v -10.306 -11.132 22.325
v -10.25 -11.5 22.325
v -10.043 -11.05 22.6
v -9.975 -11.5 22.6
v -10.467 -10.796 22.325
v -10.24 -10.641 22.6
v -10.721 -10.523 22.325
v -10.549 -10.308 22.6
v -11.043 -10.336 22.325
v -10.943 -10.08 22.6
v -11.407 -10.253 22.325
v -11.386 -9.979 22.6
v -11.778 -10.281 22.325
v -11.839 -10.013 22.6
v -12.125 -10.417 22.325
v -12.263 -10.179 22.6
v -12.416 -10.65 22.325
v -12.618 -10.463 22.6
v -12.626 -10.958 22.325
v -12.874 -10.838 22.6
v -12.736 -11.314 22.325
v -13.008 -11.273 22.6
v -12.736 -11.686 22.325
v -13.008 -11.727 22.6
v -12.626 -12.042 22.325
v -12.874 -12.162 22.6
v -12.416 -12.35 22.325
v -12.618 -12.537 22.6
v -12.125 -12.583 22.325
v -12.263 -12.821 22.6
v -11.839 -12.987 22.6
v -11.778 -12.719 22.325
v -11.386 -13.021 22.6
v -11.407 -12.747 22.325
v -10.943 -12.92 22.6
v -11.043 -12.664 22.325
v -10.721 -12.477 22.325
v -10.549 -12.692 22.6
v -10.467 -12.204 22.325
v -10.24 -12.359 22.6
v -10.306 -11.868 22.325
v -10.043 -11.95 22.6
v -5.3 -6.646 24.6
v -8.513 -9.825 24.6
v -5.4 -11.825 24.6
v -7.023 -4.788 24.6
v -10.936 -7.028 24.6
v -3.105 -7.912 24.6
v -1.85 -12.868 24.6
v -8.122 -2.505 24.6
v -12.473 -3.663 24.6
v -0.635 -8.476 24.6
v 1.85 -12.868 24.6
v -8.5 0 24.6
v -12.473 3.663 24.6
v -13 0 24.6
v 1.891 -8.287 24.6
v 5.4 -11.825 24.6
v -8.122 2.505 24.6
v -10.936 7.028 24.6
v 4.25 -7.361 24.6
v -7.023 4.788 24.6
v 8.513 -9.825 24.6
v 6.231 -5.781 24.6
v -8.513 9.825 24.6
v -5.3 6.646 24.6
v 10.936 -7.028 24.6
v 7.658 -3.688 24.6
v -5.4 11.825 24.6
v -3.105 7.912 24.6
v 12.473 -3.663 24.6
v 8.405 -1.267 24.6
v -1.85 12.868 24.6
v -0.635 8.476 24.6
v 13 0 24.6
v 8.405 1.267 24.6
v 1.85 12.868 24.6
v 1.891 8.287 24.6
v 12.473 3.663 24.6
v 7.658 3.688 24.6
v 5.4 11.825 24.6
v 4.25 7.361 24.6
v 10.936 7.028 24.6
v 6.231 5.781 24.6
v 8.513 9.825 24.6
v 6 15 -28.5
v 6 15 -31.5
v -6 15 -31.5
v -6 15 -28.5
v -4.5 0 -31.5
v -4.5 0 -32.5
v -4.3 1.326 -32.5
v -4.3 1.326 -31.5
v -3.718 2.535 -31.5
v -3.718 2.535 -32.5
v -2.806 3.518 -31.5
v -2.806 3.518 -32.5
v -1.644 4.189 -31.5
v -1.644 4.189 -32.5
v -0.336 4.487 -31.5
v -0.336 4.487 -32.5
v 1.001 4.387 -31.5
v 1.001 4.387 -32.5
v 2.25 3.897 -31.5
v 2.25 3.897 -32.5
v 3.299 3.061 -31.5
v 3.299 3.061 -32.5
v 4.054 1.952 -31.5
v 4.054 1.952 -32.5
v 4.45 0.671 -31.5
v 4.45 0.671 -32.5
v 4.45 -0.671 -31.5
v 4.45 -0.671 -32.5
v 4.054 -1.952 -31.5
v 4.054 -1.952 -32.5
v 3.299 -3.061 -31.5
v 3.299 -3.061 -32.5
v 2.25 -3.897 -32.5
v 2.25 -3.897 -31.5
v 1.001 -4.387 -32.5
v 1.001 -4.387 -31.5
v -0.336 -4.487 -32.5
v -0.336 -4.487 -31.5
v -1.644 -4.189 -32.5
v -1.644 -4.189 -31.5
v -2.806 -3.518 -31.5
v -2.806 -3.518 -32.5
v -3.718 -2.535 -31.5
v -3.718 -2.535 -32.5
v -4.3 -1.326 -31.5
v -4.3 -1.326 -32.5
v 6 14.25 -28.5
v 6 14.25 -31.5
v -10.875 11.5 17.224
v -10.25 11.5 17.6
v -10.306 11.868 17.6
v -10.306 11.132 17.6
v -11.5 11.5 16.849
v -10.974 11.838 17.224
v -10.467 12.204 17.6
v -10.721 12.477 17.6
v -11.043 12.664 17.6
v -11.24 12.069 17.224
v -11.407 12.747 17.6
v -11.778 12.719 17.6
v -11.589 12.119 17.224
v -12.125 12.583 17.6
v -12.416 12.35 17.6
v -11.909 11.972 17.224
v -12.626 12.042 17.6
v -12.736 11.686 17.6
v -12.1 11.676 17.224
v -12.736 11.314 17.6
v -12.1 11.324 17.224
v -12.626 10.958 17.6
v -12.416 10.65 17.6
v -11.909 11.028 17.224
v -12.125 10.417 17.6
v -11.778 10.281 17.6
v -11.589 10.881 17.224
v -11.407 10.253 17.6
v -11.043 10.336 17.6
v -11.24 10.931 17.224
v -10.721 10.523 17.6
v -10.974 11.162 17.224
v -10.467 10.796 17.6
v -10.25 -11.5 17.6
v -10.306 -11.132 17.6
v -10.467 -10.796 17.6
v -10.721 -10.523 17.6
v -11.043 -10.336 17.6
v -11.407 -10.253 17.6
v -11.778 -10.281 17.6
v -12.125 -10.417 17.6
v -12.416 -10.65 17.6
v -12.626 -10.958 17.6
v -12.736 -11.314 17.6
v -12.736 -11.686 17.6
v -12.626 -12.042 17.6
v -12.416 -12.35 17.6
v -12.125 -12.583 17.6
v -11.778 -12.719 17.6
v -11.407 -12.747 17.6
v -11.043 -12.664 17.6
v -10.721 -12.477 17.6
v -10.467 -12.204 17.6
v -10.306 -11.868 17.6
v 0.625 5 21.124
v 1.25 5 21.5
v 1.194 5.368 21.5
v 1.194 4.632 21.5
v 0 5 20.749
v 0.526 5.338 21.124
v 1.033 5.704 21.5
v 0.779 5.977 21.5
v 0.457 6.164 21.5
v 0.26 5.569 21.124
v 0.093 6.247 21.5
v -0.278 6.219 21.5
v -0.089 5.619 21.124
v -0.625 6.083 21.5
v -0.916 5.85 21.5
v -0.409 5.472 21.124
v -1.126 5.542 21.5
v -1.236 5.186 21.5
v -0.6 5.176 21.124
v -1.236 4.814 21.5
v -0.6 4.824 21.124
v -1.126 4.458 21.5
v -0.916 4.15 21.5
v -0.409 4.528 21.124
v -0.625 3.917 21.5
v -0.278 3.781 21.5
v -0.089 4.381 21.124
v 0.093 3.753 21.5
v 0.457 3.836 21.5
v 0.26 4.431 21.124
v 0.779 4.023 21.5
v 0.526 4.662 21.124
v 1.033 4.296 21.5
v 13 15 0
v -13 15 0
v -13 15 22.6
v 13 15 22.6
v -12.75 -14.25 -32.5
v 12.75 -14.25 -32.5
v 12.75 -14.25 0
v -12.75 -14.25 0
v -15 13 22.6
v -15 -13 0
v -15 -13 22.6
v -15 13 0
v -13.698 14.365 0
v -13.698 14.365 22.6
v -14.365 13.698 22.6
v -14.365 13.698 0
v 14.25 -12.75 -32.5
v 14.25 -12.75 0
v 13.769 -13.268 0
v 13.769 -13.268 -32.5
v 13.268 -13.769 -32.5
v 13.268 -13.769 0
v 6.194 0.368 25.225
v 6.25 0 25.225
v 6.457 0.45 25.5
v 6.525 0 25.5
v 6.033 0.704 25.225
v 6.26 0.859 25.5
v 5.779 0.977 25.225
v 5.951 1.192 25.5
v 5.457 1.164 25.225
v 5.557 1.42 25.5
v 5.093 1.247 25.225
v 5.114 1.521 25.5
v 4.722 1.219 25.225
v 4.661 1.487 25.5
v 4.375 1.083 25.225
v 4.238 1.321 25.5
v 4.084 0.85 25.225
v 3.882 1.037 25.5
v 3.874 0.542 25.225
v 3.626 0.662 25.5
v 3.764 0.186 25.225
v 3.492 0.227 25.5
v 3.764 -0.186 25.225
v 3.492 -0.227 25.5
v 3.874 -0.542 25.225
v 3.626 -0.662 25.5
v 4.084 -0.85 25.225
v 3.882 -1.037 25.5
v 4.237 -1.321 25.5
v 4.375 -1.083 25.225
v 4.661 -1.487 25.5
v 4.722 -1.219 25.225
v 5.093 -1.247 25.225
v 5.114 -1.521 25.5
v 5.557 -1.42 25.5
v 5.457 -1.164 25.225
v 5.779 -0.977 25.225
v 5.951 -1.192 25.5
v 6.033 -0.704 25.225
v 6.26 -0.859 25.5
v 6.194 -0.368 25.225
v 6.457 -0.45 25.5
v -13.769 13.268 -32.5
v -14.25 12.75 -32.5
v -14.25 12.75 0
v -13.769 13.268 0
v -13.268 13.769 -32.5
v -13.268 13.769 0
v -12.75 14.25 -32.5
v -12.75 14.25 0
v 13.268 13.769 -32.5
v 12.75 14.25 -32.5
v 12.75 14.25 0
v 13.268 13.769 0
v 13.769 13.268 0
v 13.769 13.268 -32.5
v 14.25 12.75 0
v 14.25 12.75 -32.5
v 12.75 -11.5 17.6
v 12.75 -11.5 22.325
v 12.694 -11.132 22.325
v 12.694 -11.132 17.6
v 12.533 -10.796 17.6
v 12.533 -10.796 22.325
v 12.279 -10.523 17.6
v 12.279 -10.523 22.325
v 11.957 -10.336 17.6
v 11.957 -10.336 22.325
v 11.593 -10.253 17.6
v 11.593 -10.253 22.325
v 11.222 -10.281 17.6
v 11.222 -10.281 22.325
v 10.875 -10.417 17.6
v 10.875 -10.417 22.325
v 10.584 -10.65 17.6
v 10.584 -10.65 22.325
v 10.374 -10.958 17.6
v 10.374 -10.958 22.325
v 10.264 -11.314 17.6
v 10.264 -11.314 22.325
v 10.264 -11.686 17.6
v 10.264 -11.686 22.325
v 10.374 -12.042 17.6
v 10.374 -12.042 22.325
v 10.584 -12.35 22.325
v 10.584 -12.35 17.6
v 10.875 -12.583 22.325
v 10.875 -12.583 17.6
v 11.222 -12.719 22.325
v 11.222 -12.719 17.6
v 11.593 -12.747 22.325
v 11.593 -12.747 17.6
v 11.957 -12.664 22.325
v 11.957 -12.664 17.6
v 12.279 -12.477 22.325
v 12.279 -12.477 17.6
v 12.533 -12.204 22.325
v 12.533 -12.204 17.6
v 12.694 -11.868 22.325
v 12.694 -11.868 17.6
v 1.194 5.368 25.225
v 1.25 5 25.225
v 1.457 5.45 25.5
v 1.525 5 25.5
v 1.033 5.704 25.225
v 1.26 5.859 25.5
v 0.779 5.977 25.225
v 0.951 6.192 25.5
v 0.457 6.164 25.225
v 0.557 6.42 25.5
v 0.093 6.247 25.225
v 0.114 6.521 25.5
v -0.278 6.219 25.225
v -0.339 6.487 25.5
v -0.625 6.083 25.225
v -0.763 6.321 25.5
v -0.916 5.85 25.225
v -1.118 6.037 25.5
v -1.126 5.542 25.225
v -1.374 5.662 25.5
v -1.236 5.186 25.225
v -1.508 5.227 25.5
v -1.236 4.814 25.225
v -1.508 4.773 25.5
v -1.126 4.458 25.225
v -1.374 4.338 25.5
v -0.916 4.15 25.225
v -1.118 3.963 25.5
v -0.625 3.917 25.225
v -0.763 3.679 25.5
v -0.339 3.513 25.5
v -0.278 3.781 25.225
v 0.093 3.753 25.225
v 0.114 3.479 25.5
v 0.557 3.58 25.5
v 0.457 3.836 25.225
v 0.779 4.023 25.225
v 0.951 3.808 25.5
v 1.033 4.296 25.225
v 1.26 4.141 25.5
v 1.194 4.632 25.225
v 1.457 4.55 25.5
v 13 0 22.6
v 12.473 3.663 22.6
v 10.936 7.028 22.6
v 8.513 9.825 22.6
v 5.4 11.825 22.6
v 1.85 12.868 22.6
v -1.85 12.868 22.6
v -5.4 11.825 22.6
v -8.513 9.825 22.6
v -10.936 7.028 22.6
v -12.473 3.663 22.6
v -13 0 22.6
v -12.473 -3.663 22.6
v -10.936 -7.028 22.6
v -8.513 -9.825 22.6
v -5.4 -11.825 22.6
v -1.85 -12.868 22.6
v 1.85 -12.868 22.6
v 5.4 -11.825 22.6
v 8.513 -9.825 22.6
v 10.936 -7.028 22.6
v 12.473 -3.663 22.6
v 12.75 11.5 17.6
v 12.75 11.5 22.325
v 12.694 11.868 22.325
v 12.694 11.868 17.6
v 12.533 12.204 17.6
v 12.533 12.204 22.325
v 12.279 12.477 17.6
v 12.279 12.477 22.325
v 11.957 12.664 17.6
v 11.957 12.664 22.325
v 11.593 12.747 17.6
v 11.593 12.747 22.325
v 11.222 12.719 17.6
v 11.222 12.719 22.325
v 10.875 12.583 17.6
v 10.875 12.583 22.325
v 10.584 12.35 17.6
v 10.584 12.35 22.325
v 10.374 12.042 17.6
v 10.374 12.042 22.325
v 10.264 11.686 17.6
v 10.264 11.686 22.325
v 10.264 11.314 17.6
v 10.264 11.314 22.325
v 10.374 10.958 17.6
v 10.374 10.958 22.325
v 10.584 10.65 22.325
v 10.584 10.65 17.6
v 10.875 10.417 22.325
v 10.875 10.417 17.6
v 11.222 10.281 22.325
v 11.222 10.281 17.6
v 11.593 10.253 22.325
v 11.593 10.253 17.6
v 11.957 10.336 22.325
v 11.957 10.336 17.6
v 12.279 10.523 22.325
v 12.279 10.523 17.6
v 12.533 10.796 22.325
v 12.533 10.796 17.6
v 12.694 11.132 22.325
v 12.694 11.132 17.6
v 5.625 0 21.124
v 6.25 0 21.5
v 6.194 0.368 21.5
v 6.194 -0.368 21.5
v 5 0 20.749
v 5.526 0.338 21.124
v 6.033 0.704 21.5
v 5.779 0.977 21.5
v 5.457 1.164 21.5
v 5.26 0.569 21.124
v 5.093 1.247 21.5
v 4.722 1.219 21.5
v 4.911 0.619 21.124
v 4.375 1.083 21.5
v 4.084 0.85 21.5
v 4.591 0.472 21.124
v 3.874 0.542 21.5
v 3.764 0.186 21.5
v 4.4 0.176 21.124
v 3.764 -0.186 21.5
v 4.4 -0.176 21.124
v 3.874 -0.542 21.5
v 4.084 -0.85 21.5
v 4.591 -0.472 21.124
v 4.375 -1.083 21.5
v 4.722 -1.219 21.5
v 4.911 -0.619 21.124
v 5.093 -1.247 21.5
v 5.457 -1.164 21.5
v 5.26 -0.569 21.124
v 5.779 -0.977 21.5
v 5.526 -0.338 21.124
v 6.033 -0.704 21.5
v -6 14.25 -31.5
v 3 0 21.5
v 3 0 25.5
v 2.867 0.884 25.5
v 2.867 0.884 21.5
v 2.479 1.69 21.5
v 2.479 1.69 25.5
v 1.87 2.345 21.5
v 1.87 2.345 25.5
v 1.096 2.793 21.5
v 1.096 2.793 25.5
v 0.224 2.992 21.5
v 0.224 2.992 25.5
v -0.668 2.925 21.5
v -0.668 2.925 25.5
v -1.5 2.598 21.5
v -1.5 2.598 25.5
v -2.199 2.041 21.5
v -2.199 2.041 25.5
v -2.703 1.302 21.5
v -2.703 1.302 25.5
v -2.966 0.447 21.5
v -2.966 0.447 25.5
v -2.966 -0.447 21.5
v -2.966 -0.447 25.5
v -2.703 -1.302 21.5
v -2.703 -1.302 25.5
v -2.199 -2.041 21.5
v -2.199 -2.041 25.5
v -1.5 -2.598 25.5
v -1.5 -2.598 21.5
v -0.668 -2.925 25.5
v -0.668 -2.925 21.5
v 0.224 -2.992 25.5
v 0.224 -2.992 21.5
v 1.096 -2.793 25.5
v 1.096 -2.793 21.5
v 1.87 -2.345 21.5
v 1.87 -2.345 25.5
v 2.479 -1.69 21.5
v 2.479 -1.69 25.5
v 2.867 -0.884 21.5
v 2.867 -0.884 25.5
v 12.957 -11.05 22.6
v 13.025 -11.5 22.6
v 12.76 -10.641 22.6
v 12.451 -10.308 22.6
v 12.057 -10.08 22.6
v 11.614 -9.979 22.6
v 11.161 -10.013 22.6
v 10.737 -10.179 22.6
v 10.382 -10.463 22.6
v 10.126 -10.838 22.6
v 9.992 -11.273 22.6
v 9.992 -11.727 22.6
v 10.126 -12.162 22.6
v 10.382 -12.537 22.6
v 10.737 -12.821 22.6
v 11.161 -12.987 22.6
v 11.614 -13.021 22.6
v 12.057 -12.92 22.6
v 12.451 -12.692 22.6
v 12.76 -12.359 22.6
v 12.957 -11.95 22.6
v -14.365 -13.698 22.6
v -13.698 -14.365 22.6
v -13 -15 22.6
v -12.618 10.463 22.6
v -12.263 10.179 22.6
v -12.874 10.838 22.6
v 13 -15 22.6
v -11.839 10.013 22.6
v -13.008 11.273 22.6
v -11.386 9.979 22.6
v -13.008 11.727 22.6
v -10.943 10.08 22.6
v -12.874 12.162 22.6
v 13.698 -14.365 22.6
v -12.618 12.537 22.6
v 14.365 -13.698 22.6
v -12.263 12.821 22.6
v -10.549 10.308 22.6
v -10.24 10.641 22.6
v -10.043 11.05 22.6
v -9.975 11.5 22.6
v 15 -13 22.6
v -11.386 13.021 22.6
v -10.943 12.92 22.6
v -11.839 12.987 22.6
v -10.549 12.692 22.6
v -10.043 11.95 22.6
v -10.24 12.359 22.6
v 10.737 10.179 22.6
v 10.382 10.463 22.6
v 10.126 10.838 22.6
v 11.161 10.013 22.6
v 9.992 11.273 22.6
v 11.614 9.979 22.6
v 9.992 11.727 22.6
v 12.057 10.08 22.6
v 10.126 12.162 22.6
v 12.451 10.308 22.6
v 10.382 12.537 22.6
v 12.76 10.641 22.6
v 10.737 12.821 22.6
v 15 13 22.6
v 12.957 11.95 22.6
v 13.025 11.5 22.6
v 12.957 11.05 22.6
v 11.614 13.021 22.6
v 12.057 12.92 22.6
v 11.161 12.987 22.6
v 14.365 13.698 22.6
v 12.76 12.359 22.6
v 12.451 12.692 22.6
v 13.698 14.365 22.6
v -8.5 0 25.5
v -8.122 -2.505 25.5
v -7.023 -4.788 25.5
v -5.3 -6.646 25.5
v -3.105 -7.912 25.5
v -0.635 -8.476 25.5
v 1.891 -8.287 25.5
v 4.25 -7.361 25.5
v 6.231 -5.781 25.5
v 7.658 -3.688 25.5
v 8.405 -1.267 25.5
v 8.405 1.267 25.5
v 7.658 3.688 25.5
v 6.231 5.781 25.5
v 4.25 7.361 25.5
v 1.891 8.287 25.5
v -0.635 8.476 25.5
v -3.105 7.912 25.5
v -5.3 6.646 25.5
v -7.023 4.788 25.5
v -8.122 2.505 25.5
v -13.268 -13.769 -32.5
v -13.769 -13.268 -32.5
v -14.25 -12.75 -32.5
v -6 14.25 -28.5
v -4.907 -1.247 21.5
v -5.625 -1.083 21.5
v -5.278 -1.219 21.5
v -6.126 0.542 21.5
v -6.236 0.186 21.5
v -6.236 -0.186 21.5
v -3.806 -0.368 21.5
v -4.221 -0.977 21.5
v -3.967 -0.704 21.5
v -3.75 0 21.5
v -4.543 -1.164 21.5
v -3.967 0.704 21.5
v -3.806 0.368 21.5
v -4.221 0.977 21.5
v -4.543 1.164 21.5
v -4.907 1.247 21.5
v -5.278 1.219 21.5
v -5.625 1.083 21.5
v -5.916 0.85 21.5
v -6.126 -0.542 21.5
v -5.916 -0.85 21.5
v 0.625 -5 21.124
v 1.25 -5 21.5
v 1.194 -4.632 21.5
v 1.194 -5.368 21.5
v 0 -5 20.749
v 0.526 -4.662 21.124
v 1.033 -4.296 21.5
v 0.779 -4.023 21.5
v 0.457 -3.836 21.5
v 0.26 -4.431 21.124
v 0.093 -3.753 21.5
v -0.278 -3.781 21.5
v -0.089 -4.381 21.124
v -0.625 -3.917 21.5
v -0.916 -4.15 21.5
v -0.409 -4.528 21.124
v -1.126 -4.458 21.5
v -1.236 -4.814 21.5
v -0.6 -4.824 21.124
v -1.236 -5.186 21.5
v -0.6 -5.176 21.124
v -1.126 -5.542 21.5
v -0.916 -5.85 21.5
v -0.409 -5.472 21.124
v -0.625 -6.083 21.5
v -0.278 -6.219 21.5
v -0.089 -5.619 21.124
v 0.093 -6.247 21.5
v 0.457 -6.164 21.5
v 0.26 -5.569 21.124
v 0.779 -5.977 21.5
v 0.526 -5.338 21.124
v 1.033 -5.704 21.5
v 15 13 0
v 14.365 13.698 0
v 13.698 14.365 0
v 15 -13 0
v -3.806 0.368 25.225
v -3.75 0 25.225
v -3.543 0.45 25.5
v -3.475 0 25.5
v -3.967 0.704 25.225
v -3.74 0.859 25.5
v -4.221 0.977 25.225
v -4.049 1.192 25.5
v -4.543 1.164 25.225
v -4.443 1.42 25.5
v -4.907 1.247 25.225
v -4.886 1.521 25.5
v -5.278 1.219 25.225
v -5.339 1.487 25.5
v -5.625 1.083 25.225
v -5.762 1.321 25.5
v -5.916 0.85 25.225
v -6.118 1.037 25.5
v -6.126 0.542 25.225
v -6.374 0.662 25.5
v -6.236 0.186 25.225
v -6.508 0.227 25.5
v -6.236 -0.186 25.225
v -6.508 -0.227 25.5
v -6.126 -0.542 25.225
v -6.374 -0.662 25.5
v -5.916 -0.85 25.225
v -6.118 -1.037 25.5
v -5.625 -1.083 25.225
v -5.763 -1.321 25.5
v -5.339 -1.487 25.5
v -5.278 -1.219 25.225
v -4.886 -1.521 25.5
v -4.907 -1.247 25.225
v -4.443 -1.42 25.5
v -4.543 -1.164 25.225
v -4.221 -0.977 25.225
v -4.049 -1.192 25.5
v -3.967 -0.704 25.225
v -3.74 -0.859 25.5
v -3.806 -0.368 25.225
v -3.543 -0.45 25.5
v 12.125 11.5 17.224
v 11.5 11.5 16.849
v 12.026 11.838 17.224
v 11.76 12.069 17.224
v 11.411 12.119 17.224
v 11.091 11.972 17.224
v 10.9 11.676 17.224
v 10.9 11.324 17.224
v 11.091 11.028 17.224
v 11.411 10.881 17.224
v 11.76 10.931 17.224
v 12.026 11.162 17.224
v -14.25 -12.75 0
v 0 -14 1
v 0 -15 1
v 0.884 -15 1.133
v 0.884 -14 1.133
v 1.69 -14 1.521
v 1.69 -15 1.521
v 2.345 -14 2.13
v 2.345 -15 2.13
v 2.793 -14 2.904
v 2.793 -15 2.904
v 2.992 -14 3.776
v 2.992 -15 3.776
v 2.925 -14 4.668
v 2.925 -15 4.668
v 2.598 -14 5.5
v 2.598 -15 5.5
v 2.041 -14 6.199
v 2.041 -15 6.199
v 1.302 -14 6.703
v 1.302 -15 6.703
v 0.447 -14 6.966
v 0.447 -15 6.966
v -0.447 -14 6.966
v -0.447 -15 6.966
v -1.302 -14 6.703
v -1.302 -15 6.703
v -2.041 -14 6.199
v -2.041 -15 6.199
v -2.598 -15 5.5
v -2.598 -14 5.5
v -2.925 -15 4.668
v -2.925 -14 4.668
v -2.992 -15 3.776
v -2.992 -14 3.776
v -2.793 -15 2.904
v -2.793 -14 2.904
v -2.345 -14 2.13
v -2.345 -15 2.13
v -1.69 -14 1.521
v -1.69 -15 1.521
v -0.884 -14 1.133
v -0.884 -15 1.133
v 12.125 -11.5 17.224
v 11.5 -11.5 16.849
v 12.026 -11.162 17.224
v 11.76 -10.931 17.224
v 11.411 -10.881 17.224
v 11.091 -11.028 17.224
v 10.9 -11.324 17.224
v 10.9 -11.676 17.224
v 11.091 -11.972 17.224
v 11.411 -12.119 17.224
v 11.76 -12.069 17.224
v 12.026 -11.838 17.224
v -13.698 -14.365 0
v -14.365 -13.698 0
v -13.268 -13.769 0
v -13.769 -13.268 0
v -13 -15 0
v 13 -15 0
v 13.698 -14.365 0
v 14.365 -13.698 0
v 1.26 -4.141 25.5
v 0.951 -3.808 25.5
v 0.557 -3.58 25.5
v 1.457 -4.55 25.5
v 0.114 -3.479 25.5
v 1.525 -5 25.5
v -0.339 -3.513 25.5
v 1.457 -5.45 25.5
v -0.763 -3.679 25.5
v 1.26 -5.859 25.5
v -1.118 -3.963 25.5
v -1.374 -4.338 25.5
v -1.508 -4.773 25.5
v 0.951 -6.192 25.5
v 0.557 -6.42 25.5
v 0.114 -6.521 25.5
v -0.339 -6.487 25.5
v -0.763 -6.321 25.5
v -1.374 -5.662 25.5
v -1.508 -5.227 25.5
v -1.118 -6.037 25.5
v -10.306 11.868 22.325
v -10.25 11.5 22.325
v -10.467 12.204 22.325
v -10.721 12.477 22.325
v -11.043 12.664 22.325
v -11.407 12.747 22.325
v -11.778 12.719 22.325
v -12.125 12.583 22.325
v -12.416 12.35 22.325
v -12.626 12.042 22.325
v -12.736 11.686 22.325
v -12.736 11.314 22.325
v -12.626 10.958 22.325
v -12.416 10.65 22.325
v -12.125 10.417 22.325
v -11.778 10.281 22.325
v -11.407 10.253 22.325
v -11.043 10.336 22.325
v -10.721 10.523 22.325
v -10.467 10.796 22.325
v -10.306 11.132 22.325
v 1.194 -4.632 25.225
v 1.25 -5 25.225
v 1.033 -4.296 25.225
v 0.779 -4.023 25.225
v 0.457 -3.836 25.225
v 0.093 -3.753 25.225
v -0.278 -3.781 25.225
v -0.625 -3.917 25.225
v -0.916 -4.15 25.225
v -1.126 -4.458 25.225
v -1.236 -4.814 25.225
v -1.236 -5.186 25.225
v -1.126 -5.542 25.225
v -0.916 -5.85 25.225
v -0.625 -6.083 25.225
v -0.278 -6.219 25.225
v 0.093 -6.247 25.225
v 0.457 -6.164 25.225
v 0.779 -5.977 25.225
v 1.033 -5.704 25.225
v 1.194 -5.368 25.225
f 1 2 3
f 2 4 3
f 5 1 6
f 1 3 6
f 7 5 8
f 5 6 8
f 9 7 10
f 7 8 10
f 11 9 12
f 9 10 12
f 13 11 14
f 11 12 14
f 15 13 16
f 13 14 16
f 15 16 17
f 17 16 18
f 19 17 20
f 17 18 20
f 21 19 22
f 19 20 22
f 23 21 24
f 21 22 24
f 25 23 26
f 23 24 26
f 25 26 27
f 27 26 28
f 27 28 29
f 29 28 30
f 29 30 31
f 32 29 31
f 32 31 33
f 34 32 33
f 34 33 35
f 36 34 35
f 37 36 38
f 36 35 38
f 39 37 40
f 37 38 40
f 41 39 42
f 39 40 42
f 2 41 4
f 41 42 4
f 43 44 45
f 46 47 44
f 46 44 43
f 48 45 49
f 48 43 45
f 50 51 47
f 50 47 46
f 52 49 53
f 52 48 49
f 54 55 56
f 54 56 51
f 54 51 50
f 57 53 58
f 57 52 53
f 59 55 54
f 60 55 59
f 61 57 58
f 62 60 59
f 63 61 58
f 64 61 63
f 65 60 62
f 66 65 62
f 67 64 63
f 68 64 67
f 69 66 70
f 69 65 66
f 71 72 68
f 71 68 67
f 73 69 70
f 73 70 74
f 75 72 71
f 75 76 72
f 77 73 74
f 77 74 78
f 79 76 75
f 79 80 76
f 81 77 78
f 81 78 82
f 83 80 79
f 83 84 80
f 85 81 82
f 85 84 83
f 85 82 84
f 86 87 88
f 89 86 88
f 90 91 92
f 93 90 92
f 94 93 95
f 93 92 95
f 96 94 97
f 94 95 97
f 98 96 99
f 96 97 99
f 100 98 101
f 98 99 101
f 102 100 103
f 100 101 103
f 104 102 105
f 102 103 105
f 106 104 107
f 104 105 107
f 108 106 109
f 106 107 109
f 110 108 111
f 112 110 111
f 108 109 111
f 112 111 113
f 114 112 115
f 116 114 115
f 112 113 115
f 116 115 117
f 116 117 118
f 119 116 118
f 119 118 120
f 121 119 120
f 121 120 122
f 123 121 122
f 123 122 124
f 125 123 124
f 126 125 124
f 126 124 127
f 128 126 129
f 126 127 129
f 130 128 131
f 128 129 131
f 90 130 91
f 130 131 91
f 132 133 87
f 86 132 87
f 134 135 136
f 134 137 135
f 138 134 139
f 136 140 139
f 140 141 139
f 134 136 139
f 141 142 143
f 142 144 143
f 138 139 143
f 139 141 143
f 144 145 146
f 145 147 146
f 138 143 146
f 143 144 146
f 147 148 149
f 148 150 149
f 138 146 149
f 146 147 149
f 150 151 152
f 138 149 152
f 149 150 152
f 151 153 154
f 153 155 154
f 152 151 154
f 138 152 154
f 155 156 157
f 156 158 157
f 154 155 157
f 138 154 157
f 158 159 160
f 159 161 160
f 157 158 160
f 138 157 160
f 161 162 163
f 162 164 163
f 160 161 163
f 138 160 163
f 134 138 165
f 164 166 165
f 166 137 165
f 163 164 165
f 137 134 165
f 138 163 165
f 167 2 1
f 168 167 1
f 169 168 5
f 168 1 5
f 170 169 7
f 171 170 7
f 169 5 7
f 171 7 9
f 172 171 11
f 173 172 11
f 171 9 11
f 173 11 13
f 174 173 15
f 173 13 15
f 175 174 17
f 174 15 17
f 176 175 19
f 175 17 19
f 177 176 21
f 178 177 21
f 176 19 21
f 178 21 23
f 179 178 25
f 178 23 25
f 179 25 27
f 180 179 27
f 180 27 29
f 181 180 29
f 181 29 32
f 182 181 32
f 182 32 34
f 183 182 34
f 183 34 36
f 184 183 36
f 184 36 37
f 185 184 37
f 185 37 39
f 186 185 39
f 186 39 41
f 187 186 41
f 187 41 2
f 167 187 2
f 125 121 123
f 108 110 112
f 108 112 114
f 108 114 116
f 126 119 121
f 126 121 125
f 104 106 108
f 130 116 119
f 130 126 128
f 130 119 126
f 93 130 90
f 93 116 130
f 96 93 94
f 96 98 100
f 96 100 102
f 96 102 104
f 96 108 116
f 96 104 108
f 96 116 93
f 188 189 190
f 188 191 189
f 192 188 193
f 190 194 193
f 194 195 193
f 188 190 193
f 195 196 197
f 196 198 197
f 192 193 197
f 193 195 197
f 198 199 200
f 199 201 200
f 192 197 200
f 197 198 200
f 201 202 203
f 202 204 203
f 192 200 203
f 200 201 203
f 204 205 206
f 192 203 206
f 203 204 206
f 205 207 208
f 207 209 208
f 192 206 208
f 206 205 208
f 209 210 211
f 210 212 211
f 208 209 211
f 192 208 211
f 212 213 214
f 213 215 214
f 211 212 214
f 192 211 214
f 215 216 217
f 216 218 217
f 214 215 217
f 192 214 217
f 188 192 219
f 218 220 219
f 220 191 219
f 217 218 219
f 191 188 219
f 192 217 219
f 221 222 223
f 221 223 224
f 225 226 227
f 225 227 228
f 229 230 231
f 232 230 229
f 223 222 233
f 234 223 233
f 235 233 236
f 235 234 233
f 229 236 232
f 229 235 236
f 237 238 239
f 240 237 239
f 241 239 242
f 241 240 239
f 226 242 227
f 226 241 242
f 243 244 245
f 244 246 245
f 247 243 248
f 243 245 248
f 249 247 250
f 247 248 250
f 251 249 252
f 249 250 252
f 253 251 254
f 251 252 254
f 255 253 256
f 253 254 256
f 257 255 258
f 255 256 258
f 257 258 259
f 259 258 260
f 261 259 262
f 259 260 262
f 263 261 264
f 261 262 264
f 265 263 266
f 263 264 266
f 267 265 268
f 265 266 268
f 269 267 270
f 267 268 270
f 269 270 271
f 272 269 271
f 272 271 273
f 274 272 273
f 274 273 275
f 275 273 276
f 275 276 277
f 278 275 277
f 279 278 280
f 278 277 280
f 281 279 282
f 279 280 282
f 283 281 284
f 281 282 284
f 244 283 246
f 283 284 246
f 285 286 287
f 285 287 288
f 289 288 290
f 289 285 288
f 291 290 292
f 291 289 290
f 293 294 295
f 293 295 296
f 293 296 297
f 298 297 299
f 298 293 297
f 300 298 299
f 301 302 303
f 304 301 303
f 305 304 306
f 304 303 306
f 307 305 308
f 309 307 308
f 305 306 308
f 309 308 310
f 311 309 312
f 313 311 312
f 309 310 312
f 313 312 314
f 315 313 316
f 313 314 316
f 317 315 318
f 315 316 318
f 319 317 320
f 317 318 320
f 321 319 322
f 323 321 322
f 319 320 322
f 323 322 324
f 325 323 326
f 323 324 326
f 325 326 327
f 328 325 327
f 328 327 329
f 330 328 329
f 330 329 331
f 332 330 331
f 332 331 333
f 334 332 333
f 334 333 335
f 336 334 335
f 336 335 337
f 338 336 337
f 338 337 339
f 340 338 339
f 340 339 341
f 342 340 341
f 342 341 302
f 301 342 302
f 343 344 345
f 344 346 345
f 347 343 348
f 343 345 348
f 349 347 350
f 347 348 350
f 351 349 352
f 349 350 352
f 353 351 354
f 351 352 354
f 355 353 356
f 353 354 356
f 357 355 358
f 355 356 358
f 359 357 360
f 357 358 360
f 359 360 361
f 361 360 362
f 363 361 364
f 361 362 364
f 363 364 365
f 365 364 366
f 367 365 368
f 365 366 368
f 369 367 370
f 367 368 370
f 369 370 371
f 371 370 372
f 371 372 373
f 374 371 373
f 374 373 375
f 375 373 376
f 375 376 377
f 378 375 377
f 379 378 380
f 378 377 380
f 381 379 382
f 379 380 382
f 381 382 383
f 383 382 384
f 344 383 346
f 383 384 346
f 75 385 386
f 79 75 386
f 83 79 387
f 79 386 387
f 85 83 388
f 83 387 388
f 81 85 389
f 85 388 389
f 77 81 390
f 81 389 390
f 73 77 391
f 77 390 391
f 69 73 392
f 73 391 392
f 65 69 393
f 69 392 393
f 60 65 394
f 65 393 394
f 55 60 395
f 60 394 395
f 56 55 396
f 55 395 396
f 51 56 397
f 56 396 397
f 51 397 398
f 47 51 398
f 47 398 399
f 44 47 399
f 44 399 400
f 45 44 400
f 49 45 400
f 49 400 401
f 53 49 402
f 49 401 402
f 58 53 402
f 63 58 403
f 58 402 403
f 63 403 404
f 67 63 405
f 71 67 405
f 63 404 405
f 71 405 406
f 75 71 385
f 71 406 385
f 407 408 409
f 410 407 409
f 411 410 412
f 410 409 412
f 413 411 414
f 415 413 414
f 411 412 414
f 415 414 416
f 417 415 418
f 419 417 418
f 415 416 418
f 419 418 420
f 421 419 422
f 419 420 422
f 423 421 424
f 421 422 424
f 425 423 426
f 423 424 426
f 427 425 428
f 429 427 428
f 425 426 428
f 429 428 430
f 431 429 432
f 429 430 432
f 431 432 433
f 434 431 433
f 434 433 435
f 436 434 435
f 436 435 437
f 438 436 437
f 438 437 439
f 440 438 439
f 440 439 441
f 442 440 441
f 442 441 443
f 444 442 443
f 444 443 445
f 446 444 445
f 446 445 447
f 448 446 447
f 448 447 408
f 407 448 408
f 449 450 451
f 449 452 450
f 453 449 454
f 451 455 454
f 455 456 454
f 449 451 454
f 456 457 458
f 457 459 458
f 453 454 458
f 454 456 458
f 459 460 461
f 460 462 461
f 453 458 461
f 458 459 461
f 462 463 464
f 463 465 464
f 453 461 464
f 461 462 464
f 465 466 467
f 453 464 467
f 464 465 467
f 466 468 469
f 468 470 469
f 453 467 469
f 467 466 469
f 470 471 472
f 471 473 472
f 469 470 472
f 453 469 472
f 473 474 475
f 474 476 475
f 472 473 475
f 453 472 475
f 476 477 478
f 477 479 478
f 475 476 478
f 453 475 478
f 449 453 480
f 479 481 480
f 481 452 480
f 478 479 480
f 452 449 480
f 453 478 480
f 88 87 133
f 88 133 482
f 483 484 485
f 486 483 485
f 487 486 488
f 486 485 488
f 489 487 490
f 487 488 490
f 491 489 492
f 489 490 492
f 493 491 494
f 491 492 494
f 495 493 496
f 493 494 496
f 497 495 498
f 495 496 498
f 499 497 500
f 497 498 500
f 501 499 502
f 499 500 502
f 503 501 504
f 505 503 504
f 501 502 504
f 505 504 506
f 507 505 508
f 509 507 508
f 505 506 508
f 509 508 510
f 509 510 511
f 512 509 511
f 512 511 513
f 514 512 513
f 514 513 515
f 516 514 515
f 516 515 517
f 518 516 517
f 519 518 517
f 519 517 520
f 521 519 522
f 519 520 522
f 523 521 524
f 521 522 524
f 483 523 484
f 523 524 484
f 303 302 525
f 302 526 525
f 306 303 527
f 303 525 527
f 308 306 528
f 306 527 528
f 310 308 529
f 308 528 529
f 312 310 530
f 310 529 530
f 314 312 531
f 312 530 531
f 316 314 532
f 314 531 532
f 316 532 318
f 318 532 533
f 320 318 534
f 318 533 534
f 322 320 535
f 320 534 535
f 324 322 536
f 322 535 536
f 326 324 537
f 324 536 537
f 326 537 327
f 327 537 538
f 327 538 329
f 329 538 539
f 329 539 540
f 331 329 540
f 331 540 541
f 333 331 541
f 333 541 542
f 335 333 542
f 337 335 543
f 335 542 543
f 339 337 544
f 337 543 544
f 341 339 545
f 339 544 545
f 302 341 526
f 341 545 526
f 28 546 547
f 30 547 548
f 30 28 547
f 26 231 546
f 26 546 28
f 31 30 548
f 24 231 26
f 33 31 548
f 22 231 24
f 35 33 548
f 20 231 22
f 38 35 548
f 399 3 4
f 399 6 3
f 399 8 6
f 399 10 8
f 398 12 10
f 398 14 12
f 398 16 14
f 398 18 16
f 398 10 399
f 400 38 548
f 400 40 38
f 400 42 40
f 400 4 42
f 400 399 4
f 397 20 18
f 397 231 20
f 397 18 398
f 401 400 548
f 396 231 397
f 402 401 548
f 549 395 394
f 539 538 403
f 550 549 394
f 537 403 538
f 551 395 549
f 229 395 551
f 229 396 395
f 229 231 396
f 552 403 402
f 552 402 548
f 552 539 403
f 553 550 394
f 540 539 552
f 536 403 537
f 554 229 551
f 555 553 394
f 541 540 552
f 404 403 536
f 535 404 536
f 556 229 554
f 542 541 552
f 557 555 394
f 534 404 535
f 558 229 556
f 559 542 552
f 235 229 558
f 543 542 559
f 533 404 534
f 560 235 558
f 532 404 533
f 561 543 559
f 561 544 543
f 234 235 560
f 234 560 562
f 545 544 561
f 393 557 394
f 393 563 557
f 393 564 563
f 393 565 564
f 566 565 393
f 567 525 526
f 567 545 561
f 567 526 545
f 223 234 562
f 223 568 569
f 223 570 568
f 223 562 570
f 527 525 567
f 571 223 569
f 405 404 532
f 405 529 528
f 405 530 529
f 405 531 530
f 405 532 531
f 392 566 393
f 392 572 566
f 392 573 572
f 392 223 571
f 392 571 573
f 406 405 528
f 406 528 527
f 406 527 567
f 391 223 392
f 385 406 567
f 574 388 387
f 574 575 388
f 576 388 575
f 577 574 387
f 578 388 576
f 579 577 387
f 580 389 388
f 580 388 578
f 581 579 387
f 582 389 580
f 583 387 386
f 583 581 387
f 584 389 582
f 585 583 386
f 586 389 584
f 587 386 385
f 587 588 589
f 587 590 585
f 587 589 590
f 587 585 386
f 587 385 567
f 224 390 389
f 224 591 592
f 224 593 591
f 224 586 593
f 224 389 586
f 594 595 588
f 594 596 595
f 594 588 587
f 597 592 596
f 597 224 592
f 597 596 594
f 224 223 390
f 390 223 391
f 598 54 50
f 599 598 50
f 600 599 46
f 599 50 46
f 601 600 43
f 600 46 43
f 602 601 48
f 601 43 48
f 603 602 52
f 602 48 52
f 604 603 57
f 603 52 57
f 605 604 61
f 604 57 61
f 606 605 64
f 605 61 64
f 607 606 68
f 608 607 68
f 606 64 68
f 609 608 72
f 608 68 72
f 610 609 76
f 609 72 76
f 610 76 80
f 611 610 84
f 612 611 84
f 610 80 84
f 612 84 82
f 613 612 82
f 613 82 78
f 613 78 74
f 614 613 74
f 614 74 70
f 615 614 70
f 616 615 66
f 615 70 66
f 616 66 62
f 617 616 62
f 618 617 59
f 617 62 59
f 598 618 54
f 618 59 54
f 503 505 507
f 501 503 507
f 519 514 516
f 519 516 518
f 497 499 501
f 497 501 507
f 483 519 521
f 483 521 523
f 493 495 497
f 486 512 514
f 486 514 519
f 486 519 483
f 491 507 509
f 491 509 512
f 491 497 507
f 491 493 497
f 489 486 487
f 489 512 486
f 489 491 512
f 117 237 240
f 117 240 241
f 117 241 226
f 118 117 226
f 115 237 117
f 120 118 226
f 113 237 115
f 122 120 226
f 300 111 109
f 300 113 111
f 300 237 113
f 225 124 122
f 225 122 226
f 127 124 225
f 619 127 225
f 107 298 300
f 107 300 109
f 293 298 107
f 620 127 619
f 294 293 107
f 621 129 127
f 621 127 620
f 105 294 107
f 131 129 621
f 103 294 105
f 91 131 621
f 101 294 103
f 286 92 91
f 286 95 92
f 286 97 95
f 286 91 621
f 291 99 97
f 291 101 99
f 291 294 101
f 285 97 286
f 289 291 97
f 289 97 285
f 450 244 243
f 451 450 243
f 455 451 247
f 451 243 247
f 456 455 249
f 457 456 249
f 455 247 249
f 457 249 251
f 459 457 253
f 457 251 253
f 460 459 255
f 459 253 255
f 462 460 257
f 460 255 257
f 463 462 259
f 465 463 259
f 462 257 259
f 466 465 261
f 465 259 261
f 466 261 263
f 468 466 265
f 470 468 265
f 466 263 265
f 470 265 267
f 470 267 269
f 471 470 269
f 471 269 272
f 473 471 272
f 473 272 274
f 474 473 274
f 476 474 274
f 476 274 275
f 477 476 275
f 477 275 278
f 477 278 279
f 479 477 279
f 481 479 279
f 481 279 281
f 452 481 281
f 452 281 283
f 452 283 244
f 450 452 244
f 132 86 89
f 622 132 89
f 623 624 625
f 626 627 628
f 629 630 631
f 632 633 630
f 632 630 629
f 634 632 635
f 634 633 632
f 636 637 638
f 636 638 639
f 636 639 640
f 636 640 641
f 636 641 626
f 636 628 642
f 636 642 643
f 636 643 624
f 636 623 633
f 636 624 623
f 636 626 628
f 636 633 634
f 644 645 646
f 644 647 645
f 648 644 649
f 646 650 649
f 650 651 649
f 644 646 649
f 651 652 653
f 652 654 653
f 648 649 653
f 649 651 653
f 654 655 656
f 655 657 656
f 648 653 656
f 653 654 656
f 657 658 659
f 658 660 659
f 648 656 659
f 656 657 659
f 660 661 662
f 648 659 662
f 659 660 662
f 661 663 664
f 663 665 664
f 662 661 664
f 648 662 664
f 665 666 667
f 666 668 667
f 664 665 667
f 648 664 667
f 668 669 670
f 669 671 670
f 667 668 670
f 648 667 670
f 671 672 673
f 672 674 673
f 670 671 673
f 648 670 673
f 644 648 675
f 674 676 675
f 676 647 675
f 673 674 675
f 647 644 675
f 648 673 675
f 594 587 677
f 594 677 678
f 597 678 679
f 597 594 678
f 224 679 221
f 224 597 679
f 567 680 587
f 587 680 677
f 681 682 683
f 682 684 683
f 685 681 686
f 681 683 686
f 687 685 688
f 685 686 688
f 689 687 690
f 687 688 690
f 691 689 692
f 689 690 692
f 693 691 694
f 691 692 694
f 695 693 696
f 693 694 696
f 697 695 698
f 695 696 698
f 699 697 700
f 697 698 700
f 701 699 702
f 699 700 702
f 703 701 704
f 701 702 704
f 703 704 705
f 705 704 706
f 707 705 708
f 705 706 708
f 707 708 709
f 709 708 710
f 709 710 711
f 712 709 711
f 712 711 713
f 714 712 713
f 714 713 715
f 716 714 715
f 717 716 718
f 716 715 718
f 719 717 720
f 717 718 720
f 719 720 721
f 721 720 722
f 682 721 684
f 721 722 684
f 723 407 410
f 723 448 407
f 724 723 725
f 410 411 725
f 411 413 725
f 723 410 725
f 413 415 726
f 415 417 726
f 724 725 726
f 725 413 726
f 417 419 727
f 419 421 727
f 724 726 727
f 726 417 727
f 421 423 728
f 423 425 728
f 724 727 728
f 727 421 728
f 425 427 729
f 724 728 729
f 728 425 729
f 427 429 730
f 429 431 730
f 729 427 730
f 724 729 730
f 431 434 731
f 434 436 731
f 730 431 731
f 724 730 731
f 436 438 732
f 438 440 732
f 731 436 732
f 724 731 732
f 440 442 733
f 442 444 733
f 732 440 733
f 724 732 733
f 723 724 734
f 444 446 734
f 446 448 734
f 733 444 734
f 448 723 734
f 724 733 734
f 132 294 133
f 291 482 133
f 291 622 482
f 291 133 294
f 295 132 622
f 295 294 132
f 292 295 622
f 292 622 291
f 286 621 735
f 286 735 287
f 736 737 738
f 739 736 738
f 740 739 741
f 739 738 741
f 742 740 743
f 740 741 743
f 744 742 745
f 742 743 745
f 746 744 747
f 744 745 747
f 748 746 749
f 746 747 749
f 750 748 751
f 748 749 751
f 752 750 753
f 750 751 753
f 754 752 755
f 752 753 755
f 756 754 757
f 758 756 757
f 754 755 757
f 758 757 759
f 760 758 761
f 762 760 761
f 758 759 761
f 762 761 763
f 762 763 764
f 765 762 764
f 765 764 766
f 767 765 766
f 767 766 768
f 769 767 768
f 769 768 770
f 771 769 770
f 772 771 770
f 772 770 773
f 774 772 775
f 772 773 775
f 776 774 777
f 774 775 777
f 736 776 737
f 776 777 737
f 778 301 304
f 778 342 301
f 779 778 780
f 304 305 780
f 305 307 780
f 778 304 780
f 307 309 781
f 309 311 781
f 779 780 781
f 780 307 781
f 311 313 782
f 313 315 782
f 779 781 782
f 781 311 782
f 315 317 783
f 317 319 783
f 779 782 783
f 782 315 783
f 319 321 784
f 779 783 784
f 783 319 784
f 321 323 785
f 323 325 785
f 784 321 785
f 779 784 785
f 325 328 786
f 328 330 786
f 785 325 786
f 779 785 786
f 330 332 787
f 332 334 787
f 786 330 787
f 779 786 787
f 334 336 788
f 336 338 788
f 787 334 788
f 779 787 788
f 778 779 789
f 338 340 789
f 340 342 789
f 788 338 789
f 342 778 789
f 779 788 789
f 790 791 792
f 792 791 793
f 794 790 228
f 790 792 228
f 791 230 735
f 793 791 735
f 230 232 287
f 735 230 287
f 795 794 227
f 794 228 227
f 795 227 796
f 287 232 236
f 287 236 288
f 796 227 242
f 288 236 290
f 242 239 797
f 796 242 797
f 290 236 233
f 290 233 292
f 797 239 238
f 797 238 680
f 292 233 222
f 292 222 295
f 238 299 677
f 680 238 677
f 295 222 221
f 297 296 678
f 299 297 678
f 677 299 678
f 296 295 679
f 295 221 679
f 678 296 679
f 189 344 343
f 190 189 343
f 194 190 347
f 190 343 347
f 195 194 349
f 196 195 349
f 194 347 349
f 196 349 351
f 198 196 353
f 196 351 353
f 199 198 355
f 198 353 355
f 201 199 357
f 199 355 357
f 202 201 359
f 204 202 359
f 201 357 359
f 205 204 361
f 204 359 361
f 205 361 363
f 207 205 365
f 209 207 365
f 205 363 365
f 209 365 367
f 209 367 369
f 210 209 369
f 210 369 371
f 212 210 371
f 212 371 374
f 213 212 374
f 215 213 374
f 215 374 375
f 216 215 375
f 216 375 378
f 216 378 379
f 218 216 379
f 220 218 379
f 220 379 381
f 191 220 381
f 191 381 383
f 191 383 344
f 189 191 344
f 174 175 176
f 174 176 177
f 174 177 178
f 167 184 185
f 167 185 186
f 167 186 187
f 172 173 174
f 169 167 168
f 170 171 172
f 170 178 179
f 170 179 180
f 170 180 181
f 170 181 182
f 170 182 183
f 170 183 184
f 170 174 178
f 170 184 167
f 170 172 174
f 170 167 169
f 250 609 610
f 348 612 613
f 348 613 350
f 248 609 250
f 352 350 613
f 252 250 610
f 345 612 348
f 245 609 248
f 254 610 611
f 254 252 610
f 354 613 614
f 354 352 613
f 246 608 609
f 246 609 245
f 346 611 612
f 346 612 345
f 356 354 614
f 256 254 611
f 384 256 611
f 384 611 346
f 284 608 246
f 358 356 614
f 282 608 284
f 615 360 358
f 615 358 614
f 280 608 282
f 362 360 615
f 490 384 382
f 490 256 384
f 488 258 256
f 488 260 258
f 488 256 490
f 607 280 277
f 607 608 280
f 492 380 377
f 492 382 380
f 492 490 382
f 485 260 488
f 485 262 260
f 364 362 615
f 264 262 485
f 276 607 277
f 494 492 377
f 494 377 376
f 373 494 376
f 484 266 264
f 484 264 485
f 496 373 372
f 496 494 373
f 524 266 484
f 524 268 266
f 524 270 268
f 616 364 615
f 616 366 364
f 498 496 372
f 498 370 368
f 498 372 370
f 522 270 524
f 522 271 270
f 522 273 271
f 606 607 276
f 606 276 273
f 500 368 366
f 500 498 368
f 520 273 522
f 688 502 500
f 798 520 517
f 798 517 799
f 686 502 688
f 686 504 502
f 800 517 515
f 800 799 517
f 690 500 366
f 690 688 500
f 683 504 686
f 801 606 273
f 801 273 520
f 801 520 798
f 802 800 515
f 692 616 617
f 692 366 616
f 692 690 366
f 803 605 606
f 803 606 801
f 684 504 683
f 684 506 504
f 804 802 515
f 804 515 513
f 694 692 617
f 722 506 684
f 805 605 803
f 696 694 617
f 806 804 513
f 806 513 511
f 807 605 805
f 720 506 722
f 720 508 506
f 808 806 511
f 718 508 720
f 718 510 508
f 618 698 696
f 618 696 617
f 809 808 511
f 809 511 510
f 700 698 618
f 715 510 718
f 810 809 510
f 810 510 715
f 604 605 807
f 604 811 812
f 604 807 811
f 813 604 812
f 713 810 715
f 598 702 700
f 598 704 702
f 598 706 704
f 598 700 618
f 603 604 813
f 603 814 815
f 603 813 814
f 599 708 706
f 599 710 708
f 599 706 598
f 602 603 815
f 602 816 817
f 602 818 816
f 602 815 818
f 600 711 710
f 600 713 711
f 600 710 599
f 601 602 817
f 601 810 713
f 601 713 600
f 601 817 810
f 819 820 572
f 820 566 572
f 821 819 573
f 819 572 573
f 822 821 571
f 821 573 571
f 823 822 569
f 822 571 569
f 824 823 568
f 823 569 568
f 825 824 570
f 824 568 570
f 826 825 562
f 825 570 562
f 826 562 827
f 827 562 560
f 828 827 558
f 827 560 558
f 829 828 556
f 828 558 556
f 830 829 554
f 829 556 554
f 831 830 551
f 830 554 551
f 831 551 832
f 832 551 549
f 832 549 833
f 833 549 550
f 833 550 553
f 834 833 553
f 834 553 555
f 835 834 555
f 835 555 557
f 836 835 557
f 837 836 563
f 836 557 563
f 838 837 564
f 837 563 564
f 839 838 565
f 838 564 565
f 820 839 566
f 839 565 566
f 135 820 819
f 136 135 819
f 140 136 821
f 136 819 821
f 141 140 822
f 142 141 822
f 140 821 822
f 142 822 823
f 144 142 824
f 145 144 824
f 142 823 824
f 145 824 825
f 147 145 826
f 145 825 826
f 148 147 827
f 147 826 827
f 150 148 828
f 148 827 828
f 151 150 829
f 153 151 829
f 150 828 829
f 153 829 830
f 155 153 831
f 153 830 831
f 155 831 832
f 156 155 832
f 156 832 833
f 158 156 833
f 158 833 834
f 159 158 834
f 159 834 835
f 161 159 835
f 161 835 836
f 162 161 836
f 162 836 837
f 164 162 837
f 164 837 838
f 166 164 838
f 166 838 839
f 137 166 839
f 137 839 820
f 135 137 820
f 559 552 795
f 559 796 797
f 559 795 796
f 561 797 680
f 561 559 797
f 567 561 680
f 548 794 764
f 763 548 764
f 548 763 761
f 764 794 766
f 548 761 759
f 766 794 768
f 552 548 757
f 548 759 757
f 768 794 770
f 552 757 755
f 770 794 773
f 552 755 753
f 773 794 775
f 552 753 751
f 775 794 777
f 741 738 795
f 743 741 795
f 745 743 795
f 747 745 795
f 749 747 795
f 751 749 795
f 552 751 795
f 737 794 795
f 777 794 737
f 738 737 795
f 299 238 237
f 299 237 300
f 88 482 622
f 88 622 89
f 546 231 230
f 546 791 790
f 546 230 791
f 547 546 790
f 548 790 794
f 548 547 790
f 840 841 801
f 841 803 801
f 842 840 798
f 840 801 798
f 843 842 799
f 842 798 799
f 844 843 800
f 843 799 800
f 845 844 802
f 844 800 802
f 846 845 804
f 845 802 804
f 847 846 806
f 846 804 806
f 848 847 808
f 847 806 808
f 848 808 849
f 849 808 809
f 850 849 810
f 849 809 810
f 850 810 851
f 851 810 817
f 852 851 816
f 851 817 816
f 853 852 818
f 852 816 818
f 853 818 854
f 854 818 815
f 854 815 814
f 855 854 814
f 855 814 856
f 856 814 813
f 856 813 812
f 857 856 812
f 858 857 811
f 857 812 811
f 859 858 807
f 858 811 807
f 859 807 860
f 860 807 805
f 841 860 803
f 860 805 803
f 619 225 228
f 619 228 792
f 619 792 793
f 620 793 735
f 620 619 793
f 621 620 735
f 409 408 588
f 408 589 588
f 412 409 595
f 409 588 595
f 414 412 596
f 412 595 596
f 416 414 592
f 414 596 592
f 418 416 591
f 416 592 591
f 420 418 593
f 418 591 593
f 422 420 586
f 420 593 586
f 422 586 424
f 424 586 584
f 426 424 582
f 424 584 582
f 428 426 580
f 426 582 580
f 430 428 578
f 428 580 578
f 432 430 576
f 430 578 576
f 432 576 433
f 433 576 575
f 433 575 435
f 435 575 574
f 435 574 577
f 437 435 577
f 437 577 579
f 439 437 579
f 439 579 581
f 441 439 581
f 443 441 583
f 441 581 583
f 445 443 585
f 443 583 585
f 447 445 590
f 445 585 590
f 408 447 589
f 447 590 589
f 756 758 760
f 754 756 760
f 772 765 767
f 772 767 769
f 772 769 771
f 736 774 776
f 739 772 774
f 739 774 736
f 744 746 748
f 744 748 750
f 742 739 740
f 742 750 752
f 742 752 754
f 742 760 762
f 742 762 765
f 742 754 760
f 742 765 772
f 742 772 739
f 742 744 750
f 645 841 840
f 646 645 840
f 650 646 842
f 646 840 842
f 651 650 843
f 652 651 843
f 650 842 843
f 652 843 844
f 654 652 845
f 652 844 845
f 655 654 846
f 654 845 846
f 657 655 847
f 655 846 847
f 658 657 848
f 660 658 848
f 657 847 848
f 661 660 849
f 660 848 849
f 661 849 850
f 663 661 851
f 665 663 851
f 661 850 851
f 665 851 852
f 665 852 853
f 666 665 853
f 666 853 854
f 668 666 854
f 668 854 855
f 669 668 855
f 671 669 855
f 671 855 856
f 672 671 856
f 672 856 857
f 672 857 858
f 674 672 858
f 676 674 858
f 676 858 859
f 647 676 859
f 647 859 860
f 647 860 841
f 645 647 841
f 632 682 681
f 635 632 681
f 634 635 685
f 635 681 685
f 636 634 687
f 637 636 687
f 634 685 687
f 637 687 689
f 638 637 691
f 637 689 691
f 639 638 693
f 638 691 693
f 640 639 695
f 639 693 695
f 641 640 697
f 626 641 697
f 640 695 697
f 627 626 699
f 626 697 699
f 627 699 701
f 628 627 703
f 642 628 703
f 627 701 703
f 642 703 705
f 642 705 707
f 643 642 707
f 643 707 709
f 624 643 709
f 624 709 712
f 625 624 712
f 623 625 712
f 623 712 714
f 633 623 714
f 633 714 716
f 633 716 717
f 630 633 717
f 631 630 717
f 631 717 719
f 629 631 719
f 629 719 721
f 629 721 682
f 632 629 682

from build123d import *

# Parameters (mm, degrees)
SKETCH1_W           = 30
SKETCH1_H           = 30
BOSS_EXTRUDE1_DEPTH = 22.6
SKETCH3_W           = 28.5
SKETCH3_H           = 28.5
BOSS_EXTRUDE2_DEPTH = 32.5
SKETCH4_R           = 13
BOSS_EXTRUDE3_DEPTH = 2
SKETCH5_R           = 8.5
BOSS_EXTRUDE4_DEPTH = 0.9
SKETCH6_R           = 3
SKETCH6_R_2         = 1.25
CUT_EXTRUDE1_DEPTH  = 4
SKETCH10_R          = 1.25
CUT_EXTRUDE2_DEPTH  = 5
SKETCH12_R          = 3
CUT_EXTRUDE3_DEPTH  = 1
SKETCH13_R          = 29.849433241
SKETCH13_R_2        = 19.849433241
CUT_EXTRUDE4_DEPTH  = 22.6
SKETCH14_R          = 22.5
SKETCH14_R_2        = 19.121323176
CUT_EXTRUDE5_DEPTH  = 32.5
SKETCH15_R          = 4.5
CUT_EXTRUDE6_DEPTH  = 1
BOSS_EXTRUDE5_START = -1
SKETCH16_W          = 12
SKETCH16_H          = 0.75
BOSS_EXTRUDE5_DEPTH = 3


# Read off the part's stored shape, not the designer's step: M3x0.5 Tapped Hole1, M3x0.5 Tapped Hole2
with BuildPart() as part:
    # Sketch1 → Boss-Extrude1 (new body)
    with BuildSketch(Plane.XY):
        Rectangle(SKETCH1_W, SKETCH1_H)
    extrude(amount=BOSS_EXTRUDE1_DEPTH)

    # Sketch3 → Boss-Extrude2 (add)
    with BuildSketch(Plane(origin=(0, 0, 0), x_dir=(-1, 0, 0), z_dir=(0, 0, -1))):
        Rectangle(SKETCH3_W, SKETCH3_H)
    extrude(amount=BOSS_EXTRUDE2_DEPTH)

    # Sketch4 → Boss-Extrude3 (add)
    with BuildSketch(Plane.XY.offset(22.6)):
        Circle(SKETCH4_R)
    extrude(amount=BOSS_EXTRUDE3_DEPTH)

    # Sketch5 → Boss-Extrude4 (add)
    with BuildSketch(Plane.XY.offset(24.6)):
        with Locations(Location((0, 0, 0), (0, 0, 180))):
            Circle(SKETCH5_R)
    extrude(amount=BOSS_EXTRUDE4_DEPTH)

    # Sketch6 → Cut-Extrude1 (cut)
    with BuildSketch(Plane.XY.offset(25.5)):
        Circle(SKETCH6_R)
        with Locations((0, 5)):
            Circle(SKETCH6_R_2)
        with Locations((5, 0)):
            Circle(SKETCH6_R_2)
        with Locations((0, -5)):
            Circle(SKETCH6_R_2)
        with Locations((-5, 0)):
            Circle(SKETCH6_R_2)
    extrude(amount=-CUT_EXTRUDE1_DEPTH, mode=Mode.SUBTRACT)

    # M3x0.5 Tapped Hole1 outline → M3x0.5 Tapped Hole1 (revolve, cut)
    with BuildSketch(Plane(origin=(-5, 0, 0), x_dir=(1, 0, 0), z_dir=(0, -1, 0))):
        Polygon((1.25, 25.5), (1.25, 25.225), (1.525, 25.5), align=None)
    revolve(axis=Axis((-5, 0, 0), (0, 0, 1)), mode=Mode.SUBTRACT)

    # M3x0.5 Tapped Hole1 2 outline → M3x0.5 Tapped Hole1 2 (revolve, cut)
    with BuildSketch(Plane.XZ.offset(5)):
        Polygon((1.25, 25.5), (1.25, 25.225), (1.525, 25.5), align=None)
        Polygon((0, 20.748924226), (1.25, 21.5), (0, 21.5), align=None)
    revolve(axis=Axis((0, -5, 0), (0, 0, 1)), mode=Mode.SUBTRACT)

    # M3x0.5 Tapped Hole1 3 outline → M3x0.5 Tapped Hole1 3 (revolve, cut)
    with BuildSketch(Plane(origin=(5, 0, 0), x_dir=(1, 0, 0), z_dir=(0, -1, 0))):
        Polygon((1.25, 25.5), (1.25, 25.225), (1.525, 25.5), align=None)
        Polygon((0, 20.748924226), (1.25, 21.5), (0, 21.5), align=None)
    revolve(axis=Axis((5, 0, 0), (0, 0, 1)), mode=Mode.SUBTRACT)

    # M3x0.5 Tapped Hole1 4 outline → M3x0.5 Tapped Hole1 4 (revolve, cut)
    with BuildSketch(Plane.XZ.offset(-5)):
        Polygon((1.25, 25.5), (1.25, 25.225), (1.525, 25.5), align=None)
        Polygon((0, 20.748924226), (1.25, 21.5), (0, 21.5), align=None)
    revolve(axis=Axis((0, 5, 0), (0, 0, 1)), mode=Mode.SUBTRACT)

    # Sketch10 → Cut-Extrude2 (cut)
    with BuildSketch(Plane.XY.offset(22.6)):
        with Locations((-11.5, -11.5)):
            Circle(SKETCH10_R)
        with Locations((-11.5, 11.5)):
            Circle(SKETCH10_R)
        with Locations((11.5, 11.5)):
            Circle(SKETCH10_R)
        with Locations((11.5, -11.5)):
            Circle(SKETCH10_R)
    extrude(amount=-CUT_EXTRUDE2_DEPTH, mode=Mode.SUBTRACT)

    # M3x0.5 Tapped Hole2 outline → M3x0.5 Tapped Hole2 (revolve, cut)
    with BuildSketch(Plane(origin=(-11.5, -11.5, 0), x_dir=(1, 0, 0), z_dir=(0, -1, 0))):
        Polygon((1.25, 22.6), (1.25, 22.325), (1.525, 22.6), align=None)
    revolve(axis=Axis((-11.5, -11.5, 0), (0, 0, 1)), mode=Mode.SUBTRACT)

    # M3x0.5 Tapped Hole2 2 outline → M3x0.5 Tapped Hole2 2 (revolve, cut)
    with BuildSketch(Plane(origin=(11.5, -11.5, 0), x_dir=(1, 0, 0), z_dir=(0, -1, 0))):
        Polygon((1.25, 22.6), (1.25, 22.325), (1.525, 22.6), align=None)
        Polygon((0, 16.848924226), (1.25, 17.6), (0, 17.6), align=None)
    revolve(axis=Axis((11.5, -11.5, 0), (0, 0, 1)), mode=Mode.SUBTRACT)

    # M3x0.5 Tapped Hole2 3 outline → M3x0.5 Tapped Hole2 3 (revolve, cut)
    with BuildSketch(Plane(origin=(11.5, 11.5, 0), x_dir=(1, 0, 0), z_dir=(0, -1, 0))):
        Polygon((1.25, 22.6), (1.25, 22.325), (1.525, 22.6), align=None)
        Polygon((0, 16.848924226), (1.25, 17.6), (0, 17.6), align=None)
    revolve(axis=Axis((11.5, 11.5, 0), (0, 0, 1)), mode=Mode.SUBTRACT)

    # M3x0.5 Tapped Hole2 4 outline → M3x0.5 Tapped Hole2 4 (revolve, cut)
    with BuildSketch(Plane(origin=(-11.5, 11.5, 0), x_dir=(1, 0, 0), z_dir=(0, -1, 0))):
        Polygon((1.25, 22.6), (1.25, 22.325), (1.525, 22.6), align=None)
        Polygon((0, 16.848924226), (1.25, 17.6), (0, 17.6), align=None)
    revolve(axis=Axis((-11.5, 11.5, 0), (0, 0, 1)), mode=Mode.SUBTRACT)

    # Sketch12 → Cut-Extrude3 (cut)
    with BuildSketch(Plane.XZ.offset(15)):
        with Locations(Location((0, 4, 0), (0, 0, 270))):
            Circle(SKETCH12_R)
    extrude(amount=-CUT_EXTRUDE3_DEPTH, mode=Mode.SUBTRACT)

    # Sketch13 → Cut-Extrude4 (cut)
    with BuildSketch(Plane.XY.offset(22.6)):
        Circle(SKETCH13_R)
        Circle(SKETCH13_R_2, mode=Mode.SUBTRACT)
    extrude(amount=-CUT_EXTRUDE4_DEPTH, mode=Mode.SUBTRACT)

    # Sketch14 → Cut-Extrude5 (cut)
    with BuildSketch(Plane(origin=(0, 0, -32.5), x_dir=(-1, 0, 0), z_dir=(0, 0, -1))):
        Circle(SKETCH14_R)
        Circle(SKETCH14_R_2, mode=Mode.SUBTRACT)
    extrude(amount=-CUT_EXTRUDE5_DEPTH, mode=Mode.SUBTRACT)

    # Sketch15 → Cut-Extrude6 (cut)
    with BuildSketch(Plane(origin=(0, 0, -32.5), x_dir=(-1, 0, 0), z_dir=(0, 0, -1))):
        Circle(SKETCH15_R)
    extrude(amount=-CUT_EXTRUDE6_DEPTH, mode=Mode.SUBTRACT)

    # Sketch16 → Boss-Extrude5 (add)
    with BuildSketch(Plane(origin=(0, 0, -32.5), x_dir=(-1, 0, 0), z_dir=(0, 0, -1)).offset(BOSS_EXTRUDE5_START)):
        with Locations((0, 14.625)):
            Rectangle(SKETCH16_W, SKETCH16_H)
    extrude(amount=-BOSS_EXTRUDE5_DEPTH)


solid = part.part
